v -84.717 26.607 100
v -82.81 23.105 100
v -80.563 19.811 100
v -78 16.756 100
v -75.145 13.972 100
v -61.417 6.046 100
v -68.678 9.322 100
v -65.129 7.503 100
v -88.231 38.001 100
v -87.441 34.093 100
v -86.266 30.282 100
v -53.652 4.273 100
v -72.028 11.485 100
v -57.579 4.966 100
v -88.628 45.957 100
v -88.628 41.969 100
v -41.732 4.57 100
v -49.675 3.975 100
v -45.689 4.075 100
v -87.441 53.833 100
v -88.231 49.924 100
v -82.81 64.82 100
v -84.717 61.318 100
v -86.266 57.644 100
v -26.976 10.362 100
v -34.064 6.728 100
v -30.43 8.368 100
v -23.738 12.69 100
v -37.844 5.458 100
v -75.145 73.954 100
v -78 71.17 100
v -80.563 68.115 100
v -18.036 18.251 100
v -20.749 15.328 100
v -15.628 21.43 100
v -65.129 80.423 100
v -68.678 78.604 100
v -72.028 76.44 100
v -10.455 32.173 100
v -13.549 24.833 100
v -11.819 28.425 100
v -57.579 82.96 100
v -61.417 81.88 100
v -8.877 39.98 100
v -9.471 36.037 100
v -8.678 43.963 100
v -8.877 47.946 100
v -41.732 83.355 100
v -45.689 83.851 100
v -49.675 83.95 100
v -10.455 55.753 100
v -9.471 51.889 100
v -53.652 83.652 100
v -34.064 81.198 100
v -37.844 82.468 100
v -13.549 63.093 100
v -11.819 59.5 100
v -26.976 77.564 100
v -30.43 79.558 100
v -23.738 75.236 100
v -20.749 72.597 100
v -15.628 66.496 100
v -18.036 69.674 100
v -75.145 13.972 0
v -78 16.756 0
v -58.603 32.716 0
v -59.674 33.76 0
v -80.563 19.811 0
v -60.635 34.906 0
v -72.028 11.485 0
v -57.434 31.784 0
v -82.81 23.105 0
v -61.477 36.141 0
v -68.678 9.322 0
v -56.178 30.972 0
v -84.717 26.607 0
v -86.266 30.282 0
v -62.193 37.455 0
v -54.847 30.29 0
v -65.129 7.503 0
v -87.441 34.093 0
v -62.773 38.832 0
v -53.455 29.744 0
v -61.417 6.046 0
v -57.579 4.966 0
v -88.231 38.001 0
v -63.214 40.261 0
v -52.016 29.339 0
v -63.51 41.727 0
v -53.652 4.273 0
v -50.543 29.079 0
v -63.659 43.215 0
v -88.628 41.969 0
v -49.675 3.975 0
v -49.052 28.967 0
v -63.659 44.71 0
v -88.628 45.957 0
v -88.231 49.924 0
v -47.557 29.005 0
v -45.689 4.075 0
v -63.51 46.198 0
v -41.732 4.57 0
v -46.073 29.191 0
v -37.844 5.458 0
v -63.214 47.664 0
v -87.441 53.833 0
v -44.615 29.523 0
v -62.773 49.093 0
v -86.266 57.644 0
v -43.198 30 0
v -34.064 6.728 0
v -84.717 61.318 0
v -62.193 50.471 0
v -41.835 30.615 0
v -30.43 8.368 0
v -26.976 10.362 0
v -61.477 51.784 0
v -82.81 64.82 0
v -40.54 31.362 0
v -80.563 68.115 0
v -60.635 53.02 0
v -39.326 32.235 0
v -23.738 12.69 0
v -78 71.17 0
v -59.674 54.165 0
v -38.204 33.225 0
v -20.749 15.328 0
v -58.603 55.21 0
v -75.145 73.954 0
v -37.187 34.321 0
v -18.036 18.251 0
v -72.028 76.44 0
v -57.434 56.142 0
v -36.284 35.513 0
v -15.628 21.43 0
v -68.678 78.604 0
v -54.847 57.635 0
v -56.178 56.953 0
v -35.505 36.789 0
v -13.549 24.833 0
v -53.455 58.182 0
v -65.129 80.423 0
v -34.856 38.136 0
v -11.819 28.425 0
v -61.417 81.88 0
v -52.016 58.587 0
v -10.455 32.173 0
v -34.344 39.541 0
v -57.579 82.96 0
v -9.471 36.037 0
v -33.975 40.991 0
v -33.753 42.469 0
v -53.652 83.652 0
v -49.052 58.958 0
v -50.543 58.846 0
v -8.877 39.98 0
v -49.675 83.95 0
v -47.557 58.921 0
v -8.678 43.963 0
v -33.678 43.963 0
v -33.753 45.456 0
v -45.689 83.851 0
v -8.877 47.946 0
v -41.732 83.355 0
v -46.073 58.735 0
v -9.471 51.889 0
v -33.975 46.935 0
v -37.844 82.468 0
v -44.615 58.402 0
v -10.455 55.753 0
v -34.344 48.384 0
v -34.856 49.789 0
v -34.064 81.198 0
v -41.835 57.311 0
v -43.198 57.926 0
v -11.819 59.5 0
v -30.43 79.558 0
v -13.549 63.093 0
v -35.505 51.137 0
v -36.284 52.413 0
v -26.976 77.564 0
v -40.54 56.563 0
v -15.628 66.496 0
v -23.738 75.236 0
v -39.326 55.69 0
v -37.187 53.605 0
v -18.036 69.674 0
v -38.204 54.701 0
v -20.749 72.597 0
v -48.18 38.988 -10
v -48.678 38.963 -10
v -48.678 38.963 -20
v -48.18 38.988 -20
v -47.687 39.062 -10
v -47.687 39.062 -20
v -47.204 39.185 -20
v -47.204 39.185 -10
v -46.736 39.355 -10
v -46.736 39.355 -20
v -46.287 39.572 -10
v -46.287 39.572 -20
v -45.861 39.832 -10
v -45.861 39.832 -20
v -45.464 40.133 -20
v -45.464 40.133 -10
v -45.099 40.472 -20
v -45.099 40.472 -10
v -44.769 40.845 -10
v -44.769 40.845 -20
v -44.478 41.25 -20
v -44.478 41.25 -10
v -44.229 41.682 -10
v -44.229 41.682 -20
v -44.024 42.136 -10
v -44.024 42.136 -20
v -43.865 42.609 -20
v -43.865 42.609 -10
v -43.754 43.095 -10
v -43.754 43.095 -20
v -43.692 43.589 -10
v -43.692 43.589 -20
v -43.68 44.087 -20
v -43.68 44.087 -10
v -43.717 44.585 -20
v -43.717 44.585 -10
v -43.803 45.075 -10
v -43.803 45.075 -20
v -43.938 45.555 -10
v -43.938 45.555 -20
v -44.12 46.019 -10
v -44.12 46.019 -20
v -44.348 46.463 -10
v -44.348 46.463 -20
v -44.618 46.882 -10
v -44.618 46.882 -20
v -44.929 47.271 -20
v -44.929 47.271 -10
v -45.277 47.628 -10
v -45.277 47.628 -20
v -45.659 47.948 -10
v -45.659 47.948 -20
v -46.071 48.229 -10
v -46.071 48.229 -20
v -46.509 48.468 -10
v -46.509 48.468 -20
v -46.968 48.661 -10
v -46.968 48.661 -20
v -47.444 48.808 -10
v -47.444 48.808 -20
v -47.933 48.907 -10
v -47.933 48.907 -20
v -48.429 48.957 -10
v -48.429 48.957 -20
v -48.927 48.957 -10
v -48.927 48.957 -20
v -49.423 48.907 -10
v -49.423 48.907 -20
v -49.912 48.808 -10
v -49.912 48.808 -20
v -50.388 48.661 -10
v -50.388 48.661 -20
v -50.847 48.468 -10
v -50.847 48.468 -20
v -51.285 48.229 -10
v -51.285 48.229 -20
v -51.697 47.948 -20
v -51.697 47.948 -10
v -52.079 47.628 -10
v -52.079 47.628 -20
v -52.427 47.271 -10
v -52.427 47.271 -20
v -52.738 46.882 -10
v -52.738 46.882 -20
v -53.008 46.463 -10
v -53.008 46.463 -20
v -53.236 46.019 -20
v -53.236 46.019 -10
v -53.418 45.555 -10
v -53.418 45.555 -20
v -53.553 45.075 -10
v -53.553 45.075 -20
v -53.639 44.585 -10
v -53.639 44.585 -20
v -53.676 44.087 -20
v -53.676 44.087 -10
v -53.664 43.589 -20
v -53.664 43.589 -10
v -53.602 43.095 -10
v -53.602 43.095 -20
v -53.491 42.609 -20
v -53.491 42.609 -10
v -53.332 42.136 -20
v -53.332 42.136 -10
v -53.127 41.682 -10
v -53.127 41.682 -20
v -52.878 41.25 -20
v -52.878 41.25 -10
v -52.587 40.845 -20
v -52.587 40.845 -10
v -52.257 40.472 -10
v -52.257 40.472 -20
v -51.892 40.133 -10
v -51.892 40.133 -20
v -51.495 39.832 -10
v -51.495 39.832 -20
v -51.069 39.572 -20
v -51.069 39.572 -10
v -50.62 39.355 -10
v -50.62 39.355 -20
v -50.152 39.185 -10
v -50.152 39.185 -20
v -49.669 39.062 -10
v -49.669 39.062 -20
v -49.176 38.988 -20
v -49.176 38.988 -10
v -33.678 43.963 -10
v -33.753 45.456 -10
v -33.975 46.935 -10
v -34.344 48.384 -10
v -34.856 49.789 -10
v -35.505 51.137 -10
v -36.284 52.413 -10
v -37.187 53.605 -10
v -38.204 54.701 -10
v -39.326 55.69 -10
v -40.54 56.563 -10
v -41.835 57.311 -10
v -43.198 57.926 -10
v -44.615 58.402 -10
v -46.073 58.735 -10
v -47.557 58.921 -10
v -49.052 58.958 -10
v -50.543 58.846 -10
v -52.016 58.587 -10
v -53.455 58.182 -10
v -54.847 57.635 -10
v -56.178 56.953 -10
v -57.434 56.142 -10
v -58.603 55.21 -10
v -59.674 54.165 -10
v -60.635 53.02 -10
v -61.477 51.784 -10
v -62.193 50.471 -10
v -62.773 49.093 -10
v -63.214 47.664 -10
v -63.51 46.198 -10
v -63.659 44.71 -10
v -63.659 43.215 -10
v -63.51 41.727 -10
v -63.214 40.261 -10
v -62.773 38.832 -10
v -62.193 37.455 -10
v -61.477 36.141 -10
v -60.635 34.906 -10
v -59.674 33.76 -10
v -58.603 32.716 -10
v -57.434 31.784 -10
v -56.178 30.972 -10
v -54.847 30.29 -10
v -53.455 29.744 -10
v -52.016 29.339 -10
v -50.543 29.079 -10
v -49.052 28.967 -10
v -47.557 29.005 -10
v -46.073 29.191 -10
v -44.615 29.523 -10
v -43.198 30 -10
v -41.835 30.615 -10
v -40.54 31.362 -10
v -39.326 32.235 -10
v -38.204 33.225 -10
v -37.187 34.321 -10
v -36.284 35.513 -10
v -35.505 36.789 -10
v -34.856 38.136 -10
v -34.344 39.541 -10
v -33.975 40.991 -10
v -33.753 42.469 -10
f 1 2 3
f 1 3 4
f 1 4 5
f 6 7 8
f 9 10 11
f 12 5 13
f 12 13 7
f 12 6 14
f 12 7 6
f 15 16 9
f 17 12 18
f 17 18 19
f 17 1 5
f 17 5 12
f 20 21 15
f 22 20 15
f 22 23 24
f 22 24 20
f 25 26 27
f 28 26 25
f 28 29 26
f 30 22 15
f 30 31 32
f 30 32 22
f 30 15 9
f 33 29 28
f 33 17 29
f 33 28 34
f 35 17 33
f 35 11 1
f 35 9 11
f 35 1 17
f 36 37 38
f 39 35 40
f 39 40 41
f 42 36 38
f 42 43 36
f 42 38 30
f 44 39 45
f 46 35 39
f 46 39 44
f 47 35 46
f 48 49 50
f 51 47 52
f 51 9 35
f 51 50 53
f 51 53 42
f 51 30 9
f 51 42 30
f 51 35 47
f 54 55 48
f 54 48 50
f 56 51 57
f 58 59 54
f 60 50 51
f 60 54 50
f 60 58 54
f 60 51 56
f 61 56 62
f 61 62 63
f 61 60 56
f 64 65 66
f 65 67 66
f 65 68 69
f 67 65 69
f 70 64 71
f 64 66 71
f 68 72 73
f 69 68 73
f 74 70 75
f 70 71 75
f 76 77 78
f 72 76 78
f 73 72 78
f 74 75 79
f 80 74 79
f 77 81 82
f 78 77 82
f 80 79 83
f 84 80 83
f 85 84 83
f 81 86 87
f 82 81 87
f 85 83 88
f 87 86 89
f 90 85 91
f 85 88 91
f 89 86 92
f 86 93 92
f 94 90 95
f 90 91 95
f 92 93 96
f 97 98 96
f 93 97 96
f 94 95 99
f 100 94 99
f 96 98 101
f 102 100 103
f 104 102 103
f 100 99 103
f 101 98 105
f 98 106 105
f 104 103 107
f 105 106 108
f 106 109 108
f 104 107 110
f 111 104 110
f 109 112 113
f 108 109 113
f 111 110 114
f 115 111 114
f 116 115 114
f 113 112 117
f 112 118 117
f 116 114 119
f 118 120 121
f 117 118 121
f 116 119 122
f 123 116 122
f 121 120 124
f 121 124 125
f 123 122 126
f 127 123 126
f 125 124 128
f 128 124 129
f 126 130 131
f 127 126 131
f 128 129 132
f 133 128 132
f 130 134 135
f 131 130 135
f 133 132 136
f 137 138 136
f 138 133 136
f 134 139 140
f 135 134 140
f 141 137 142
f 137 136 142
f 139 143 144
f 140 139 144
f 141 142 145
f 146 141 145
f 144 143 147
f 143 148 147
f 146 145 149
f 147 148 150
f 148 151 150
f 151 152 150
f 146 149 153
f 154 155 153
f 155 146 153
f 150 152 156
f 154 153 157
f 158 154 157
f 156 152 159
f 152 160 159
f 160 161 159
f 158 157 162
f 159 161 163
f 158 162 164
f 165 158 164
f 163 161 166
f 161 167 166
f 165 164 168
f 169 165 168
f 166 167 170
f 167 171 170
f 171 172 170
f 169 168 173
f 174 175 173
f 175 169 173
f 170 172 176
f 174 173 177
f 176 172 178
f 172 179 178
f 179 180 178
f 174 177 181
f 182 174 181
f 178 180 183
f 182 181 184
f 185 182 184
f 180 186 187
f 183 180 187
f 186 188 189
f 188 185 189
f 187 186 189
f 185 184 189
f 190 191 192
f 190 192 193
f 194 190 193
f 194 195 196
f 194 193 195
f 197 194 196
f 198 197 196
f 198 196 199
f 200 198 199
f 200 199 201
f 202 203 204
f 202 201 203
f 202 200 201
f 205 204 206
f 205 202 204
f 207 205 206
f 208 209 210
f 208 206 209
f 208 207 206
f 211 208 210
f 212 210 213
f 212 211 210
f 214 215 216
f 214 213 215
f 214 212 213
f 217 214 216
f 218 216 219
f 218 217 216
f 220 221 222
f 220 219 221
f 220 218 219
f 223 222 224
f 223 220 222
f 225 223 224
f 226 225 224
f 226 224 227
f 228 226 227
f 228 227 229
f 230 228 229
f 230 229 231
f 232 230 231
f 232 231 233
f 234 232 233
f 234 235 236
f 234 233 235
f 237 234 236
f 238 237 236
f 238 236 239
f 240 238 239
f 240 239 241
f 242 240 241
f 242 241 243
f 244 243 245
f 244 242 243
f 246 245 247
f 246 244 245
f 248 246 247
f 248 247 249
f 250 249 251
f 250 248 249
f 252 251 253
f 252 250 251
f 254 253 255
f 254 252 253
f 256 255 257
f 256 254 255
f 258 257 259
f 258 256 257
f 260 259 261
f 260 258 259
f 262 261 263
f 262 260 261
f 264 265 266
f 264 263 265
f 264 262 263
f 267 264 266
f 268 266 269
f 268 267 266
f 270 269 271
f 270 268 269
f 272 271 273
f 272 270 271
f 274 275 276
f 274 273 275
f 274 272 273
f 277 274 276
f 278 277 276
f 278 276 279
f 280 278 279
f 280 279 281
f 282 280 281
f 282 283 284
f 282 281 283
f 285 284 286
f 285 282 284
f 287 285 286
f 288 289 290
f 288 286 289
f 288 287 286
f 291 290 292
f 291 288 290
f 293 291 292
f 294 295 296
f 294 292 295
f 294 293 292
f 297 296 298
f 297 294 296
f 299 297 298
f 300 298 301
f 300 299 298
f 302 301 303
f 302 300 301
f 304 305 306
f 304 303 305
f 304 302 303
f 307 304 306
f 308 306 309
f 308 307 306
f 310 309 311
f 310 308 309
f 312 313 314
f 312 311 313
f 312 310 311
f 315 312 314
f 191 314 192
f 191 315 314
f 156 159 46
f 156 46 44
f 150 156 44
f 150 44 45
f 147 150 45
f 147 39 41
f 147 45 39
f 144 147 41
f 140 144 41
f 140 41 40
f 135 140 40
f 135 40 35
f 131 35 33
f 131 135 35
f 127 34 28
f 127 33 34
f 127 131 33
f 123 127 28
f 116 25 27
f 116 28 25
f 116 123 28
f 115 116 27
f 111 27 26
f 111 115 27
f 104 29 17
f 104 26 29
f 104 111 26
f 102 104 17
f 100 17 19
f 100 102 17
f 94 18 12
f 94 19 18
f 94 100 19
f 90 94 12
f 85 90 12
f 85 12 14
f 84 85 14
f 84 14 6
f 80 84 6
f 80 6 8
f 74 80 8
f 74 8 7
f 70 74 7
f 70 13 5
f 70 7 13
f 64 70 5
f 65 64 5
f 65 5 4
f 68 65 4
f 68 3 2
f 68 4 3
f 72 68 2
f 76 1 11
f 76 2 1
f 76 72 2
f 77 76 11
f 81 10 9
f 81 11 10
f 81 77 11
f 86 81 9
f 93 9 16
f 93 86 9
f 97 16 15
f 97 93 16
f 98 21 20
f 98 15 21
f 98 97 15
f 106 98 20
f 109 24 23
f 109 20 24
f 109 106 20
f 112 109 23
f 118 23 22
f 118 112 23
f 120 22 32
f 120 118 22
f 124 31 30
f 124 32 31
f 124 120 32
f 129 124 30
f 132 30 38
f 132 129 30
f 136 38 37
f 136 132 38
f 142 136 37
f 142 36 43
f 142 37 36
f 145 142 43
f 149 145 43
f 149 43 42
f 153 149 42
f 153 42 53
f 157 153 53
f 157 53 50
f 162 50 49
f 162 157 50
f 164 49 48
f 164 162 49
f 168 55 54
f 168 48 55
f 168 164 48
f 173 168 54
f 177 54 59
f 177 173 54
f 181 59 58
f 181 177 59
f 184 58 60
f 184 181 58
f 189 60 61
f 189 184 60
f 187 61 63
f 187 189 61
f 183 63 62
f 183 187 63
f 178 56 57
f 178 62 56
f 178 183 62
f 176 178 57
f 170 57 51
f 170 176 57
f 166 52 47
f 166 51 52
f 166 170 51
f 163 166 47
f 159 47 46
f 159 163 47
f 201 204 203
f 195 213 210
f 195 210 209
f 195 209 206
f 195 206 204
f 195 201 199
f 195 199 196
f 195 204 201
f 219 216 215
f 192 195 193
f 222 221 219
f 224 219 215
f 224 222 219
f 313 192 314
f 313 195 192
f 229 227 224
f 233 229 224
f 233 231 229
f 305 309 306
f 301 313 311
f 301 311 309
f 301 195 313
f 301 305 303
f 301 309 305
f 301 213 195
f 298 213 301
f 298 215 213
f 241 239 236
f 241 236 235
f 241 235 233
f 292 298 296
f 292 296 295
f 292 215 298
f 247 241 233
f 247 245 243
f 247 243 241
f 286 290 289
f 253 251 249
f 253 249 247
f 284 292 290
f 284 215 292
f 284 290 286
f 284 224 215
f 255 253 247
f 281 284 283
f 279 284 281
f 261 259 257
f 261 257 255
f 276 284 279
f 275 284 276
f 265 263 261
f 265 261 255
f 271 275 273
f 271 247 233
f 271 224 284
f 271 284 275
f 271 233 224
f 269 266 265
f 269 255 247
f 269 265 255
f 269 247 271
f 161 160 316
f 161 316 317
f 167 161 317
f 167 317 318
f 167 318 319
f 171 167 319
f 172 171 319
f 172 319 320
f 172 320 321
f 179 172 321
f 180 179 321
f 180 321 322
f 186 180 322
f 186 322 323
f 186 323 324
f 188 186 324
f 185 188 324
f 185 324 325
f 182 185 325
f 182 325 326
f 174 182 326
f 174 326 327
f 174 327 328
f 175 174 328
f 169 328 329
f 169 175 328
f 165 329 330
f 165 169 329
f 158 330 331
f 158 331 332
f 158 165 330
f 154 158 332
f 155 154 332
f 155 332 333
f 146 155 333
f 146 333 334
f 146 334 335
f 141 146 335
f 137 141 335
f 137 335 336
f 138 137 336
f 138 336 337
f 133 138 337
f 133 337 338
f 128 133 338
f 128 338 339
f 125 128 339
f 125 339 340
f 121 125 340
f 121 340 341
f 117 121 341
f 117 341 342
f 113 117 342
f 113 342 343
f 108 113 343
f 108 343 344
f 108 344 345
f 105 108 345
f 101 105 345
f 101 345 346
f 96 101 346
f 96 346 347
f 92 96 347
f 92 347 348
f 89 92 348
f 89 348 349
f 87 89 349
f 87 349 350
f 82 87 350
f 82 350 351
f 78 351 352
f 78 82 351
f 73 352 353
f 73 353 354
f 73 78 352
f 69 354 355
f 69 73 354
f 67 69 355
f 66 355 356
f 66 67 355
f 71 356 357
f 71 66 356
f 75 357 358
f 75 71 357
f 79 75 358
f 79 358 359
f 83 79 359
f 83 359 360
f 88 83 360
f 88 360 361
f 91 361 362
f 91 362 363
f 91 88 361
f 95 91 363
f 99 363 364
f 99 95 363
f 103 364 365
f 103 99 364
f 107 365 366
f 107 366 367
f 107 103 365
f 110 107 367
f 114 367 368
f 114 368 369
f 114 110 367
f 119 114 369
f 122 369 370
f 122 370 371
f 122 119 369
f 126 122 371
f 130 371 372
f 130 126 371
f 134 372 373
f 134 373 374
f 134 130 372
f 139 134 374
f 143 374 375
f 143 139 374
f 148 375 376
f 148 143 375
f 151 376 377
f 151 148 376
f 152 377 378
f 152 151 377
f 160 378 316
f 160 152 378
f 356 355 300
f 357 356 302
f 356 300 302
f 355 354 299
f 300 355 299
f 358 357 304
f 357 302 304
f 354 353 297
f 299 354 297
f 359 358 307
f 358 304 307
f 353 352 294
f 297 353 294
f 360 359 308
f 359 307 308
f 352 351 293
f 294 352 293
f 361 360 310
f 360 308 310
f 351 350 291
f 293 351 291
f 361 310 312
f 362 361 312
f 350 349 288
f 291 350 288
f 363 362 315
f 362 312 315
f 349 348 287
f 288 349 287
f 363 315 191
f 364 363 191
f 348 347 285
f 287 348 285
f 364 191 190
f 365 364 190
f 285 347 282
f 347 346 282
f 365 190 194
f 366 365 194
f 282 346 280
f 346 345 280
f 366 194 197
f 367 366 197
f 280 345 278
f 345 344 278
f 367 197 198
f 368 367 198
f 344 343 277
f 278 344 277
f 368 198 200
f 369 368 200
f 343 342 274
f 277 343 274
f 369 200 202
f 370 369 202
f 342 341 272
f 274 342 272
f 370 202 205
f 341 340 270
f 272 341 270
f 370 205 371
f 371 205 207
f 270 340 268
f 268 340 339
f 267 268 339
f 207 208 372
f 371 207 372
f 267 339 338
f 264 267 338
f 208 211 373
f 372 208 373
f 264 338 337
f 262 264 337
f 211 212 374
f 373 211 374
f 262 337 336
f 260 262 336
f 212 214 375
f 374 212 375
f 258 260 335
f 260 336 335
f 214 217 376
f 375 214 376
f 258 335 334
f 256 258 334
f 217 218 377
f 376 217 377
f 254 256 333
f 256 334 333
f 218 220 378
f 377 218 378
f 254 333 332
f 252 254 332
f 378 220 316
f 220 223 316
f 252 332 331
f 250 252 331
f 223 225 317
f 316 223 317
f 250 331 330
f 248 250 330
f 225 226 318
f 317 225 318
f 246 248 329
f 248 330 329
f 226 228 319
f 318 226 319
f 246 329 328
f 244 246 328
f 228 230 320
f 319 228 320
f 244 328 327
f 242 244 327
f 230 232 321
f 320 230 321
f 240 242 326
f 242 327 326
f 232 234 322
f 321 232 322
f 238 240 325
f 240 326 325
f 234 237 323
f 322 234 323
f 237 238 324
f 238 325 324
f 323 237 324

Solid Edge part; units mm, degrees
sketch "Sketch1" plane through (0, 0, 0) normal (0, 0, 1) x (1, 0, 0)
  circle A0 centre (-48.678, 43.9628) radius 40
extrude "Protrusion1" add sketch "Sketch1" along normal blind 100
sketch "Sketch2" plane through (0, 0, 0) normal (0, 0, 1) x (1, 0, 0)
  circle A0 centre (-48.678, 43.9628) radius 15
extrude "ExtrudedProtrusion_3" add sketch "Sketch2" against normal blind 10
sketch "Sketch3" plane through (-48.678, 43.9628, -10) normal (0, 0, -1) x (0, -1, 0)
  circle A0 centre (0, 0) radius 5
extrude "ExtrudedProtrusion_4" add sketch "Sketch3" along normal blind 10
